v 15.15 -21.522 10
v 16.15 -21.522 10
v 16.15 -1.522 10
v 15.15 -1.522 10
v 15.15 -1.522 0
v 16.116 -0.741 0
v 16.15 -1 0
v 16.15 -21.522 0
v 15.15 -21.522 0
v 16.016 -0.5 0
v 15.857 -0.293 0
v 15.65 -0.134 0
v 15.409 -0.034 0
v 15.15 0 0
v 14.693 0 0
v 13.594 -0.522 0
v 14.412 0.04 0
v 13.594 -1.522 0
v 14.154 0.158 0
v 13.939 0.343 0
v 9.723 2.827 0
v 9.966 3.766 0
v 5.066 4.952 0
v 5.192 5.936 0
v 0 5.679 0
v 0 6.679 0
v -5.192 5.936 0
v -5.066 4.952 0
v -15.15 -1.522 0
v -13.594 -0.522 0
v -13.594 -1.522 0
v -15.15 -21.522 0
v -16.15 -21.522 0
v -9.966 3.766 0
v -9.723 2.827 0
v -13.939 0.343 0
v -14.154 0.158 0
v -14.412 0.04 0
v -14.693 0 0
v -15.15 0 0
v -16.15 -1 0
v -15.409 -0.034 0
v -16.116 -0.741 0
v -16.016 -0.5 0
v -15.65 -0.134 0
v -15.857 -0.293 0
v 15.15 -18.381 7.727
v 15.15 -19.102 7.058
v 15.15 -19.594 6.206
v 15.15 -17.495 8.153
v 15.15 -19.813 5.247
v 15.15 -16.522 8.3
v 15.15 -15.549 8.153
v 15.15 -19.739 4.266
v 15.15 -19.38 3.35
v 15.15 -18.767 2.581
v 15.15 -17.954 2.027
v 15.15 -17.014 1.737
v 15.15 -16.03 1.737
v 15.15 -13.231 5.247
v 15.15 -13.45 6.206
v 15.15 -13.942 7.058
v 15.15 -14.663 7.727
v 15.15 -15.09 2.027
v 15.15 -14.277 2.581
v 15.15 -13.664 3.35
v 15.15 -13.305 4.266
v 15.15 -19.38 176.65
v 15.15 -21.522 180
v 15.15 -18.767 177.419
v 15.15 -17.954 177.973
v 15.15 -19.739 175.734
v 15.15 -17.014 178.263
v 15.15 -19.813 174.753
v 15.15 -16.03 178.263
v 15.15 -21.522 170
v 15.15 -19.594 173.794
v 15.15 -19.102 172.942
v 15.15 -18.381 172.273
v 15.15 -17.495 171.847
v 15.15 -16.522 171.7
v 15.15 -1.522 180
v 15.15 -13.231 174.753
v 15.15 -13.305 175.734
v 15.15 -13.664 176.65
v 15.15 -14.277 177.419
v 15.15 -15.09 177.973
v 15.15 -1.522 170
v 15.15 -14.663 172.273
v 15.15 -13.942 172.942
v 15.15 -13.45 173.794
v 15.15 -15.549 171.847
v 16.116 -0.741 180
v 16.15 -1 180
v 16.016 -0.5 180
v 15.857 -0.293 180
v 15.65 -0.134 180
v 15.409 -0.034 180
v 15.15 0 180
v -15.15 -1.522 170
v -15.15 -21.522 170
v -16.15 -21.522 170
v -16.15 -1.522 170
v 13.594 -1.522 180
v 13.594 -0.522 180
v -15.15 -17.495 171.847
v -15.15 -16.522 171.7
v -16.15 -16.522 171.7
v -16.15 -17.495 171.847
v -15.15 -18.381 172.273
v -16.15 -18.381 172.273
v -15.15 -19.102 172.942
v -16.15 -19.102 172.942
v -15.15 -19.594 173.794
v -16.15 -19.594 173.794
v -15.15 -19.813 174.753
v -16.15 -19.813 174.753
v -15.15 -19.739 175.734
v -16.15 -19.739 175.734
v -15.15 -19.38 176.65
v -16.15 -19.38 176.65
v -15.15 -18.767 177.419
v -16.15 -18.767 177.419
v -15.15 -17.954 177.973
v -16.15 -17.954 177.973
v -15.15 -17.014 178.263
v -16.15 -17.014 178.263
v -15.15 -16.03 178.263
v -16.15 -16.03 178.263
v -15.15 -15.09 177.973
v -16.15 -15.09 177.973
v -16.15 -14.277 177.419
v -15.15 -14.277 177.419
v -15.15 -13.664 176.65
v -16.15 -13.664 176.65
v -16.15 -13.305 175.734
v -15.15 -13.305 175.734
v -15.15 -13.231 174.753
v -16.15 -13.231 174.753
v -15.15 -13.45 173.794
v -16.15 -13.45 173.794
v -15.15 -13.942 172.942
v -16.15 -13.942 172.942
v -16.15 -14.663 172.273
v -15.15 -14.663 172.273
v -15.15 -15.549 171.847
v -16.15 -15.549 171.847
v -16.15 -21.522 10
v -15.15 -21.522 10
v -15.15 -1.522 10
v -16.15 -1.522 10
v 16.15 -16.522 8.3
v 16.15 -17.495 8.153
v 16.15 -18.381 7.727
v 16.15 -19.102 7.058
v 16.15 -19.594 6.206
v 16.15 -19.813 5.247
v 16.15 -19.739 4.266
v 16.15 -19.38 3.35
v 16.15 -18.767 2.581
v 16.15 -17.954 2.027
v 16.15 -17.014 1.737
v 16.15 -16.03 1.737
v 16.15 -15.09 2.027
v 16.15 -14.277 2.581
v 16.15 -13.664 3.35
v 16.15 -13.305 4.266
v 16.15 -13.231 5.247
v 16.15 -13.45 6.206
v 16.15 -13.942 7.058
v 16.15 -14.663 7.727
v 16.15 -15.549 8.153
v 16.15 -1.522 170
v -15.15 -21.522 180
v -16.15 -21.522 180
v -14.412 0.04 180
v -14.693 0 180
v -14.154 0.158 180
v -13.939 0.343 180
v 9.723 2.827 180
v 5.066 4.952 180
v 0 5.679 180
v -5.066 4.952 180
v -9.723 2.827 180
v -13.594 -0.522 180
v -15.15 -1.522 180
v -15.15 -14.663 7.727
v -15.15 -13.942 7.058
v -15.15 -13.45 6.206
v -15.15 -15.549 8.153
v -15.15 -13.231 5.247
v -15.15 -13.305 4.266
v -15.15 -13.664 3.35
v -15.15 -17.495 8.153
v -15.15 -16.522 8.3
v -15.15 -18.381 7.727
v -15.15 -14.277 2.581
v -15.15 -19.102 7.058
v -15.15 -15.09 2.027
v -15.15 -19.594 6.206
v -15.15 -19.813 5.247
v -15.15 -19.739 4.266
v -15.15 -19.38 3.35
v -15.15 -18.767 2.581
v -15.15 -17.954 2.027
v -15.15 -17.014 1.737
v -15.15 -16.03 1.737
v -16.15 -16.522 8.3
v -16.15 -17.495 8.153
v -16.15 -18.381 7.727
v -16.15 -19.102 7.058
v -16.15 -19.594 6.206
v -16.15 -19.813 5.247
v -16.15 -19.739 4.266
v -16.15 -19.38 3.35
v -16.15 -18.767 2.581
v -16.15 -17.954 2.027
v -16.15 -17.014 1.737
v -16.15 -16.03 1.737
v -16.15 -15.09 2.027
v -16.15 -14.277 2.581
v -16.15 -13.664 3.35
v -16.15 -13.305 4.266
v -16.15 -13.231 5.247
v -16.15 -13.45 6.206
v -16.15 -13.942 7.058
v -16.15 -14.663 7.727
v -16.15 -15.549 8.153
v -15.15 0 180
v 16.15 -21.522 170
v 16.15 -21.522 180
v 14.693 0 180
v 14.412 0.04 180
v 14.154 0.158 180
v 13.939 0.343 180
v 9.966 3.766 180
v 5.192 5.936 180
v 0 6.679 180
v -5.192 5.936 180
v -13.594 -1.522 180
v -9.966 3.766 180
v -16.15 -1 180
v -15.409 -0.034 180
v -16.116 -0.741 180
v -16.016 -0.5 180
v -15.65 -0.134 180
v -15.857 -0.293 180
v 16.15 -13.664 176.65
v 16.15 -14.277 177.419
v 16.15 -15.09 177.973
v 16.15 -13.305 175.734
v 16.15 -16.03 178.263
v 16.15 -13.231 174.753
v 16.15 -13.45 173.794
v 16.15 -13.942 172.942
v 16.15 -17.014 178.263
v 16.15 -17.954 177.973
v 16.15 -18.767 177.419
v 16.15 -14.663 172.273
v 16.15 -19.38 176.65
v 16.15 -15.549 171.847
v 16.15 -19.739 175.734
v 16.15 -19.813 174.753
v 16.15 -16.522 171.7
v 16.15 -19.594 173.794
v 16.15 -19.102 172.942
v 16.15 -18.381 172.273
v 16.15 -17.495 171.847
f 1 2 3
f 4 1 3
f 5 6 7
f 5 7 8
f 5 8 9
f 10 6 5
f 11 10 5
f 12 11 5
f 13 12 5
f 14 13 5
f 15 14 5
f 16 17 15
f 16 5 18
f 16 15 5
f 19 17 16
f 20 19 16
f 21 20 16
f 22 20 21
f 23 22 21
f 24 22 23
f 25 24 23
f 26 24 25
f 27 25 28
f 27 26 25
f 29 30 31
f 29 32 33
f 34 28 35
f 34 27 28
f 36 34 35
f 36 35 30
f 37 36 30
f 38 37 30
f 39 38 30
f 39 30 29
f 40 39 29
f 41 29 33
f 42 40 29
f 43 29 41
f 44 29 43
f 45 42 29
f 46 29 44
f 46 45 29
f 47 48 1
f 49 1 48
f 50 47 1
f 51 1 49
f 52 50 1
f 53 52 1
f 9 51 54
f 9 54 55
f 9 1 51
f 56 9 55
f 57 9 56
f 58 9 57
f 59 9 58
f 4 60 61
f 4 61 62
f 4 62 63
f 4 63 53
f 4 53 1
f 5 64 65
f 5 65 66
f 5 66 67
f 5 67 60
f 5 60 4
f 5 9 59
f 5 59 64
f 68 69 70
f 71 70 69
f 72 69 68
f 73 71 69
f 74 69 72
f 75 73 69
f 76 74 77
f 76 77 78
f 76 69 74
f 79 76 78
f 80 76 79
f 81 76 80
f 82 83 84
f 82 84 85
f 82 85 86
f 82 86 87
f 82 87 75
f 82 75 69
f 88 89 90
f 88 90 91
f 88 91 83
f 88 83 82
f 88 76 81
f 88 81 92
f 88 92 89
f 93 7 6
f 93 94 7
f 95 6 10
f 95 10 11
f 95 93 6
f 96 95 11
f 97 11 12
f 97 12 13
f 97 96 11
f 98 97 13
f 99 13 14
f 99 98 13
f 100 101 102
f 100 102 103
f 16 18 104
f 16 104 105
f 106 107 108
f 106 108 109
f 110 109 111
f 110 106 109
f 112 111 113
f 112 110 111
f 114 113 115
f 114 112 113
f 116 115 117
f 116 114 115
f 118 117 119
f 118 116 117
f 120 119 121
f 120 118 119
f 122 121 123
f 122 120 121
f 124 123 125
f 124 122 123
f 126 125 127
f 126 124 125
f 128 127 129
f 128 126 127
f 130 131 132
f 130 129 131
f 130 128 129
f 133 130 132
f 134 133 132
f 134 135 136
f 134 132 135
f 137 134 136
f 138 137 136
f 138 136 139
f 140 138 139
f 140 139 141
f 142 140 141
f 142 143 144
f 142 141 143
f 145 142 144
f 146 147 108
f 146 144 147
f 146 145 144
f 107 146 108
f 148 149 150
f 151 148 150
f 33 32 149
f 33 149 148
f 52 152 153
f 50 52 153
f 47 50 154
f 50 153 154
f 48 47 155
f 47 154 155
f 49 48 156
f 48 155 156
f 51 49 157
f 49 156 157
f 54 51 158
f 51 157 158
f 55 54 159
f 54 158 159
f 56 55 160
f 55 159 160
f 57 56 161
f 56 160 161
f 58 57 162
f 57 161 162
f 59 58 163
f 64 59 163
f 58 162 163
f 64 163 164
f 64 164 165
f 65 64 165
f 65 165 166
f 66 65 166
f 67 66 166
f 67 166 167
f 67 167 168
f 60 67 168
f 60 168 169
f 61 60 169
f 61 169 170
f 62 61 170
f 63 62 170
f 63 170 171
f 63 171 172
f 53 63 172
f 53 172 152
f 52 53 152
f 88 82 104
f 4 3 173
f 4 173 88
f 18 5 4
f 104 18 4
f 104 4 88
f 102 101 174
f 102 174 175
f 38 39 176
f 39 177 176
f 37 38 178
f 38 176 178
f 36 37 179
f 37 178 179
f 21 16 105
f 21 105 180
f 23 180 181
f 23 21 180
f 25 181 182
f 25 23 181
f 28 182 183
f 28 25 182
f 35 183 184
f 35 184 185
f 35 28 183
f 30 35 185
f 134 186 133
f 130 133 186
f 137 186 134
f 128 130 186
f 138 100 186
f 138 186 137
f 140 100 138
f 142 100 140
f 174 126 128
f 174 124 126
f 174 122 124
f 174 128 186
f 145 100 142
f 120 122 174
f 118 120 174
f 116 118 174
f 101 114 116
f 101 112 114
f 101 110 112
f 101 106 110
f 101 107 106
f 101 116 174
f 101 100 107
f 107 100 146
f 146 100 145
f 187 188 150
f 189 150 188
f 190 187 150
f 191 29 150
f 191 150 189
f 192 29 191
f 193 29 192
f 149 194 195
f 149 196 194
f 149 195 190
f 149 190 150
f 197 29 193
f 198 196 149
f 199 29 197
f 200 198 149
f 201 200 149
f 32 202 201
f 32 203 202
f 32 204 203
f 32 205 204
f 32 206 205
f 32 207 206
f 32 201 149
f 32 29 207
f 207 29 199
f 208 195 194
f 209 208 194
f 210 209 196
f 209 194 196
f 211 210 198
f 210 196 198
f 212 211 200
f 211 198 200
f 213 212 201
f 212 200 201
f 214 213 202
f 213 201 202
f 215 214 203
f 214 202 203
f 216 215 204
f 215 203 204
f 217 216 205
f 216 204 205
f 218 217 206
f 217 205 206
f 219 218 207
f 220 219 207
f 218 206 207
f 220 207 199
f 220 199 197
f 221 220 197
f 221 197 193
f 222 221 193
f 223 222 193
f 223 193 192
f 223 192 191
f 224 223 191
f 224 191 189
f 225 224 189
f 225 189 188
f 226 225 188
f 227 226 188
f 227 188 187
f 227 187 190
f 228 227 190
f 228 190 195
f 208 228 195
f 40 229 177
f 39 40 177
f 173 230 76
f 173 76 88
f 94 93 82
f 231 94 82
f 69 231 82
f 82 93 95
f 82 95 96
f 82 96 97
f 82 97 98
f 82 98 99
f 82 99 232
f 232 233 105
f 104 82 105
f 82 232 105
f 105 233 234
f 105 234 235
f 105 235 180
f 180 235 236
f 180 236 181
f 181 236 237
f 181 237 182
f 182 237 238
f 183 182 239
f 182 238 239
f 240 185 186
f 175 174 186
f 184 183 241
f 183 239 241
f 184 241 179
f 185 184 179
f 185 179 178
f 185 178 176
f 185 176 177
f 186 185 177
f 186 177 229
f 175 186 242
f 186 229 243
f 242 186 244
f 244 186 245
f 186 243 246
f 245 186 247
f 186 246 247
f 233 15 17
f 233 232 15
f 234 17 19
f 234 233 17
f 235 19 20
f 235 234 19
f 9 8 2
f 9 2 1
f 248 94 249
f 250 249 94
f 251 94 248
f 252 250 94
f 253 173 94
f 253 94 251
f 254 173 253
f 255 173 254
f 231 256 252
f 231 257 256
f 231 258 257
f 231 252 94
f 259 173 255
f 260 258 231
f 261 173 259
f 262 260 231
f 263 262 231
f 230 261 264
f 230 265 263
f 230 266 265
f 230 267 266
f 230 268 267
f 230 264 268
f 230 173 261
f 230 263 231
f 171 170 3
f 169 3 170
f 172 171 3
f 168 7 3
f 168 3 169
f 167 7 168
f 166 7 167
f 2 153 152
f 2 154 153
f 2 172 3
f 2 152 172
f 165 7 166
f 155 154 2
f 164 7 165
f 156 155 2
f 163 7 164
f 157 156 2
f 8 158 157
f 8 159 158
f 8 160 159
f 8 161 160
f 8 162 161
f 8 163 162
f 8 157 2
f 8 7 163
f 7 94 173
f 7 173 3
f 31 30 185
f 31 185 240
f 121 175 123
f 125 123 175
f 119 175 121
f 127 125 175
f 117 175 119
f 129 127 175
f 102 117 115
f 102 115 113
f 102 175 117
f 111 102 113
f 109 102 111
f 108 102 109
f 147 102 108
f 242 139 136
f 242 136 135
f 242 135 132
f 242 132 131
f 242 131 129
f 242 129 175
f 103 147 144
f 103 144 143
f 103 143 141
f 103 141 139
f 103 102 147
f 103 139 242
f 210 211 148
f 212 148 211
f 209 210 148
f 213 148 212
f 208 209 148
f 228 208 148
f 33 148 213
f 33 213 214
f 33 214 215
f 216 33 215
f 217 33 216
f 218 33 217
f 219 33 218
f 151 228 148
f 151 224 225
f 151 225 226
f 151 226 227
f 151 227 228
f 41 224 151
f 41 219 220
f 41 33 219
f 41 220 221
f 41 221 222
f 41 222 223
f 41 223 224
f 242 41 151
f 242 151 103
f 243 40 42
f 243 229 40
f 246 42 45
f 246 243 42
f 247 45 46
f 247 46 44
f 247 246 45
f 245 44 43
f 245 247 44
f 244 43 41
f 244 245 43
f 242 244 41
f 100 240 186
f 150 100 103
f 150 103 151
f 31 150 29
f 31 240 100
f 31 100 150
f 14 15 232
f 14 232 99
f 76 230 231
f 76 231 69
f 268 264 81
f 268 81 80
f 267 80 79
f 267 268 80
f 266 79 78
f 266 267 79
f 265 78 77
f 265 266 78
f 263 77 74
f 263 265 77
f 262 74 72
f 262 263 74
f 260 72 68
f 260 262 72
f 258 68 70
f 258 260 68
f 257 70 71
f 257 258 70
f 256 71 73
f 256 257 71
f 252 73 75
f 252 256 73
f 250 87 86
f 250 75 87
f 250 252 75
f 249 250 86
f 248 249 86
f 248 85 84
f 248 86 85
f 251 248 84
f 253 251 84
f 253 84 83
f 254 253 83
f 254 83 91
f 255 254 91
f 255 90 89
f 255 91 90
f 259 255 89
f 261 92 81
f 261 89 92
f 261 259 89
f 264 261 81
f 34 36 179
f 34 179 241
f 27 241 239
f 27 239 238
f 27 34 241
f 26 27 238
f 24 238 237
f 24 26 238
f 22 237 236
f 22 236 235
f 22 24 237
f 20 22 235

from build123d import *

# Parameters (mm, degrees)
AUFSATZ_LINEAR_AUSTRAGEN1_DEPTH = 180
DURCHGANGSLOCH_F_R_M61_D        = 6.6
SKIZZE4_W                       = 160
SKIZZE4_H                       = 20
SCHNITT_LINEAR_AUSTRAGEN1_DEPTH = 185.137137843
VERRUNDUNG1_R                   = 1


with BuildPart() as part:
    # Skizze1 → Aufsatz-Linear austragen1 (new body)
    with BuildSketch(Plane.XY):
        with BuildLine():
            Line((-16.15, 0), (-14.230984974, 0))
            ThreePointArc((-14.230984974, 0), (0, 6.679295001), (14.230984974, 0))
            Line((14.230984974, 0), (16.15, 0))
            Line((16.15, 0), (16.15, -21.521977909))
            Line((16.15, -21.521977909), (15.15, -21.521977909))
            Line((15.15, -21.521977909), (15.15, -1.521977909))
            Line((15.15, -1.521977909), (15, -1.521977909))
            Line((15, -1.521977909), (13.59375, -1.521977909))
            Line((13.59375, -1.521977909), (13.59375, -0.521977909))
            ThreePointArc((13.59375, -0.521977909), (0, 5.679295001), (-13.59375, -0.521977909))
            Line((-13.59375, -0.521977909), (-13.59375, -1.521977909))
            Line((-13.59375, -1.521977909), (-15, -1.521977909))
            Line((-15, -1.521977909), (-15.15, -1.521977909))
            Line((-15.15, -1.521977909), (-15.15, -21.521977909))
            Line((-15.15, -21.521977909), (-16.15, -21.521977909))
            Line((-16.15, -21.521977909), (-16.15, 0))
        make_face()
    extrude(amount=AUFSATZ_LINEAR_AUSTRAGEN1_DEPTH)

    # Durchgangsloch für M61 (through all)
    with Locations(Plane(origin=(-16.15, 0, 0), x_dir=(0, 0, -1), z_dir=(-1, 0, 0))):
        with Locations((-5, 16.521977909)):
            durchgangsloch_f_r_m61 = Hole(DURCHGANGSLOCH_F_R_M61_D / 2)

    # Spiegeln1: Durchgangsloch für M61 across plane
    add(durchgangsloch_f_r_m61.mirror(Plane.XY.offset(90)), mode=Mode.SUBTRACT)

    # Skizze4 → Schnitt-Linear austragen1 (cut, through all)
    with BuildSketch(Plane(origin=(16.15, 0, 0), x_dir=(0, 0, -1), z_dir=(1, 0, 0))):
        with Locations((-90, -11.521977909)):
            Rectangle(SKIZZE4_W, SKIZZE4_H)
    extrude(amount=-SCHNITT_LINEAR_AUSTRAGEN1_DEPTH, mode=Mode.SUBTRACT)

    # Verrundung1
    verrundung1_edges = [part.edges().sort_by_distance(p)[0] for p in [
        (14.230984974, 0, 90),
        (16.15, 0, 90),
        (-16.15, 0, 90),
        (-14.230984974, 0, 90),
    ]]
    fillet(verrundung1_edges, radius=VERRUNDUNG1_R)


solid = part.part
